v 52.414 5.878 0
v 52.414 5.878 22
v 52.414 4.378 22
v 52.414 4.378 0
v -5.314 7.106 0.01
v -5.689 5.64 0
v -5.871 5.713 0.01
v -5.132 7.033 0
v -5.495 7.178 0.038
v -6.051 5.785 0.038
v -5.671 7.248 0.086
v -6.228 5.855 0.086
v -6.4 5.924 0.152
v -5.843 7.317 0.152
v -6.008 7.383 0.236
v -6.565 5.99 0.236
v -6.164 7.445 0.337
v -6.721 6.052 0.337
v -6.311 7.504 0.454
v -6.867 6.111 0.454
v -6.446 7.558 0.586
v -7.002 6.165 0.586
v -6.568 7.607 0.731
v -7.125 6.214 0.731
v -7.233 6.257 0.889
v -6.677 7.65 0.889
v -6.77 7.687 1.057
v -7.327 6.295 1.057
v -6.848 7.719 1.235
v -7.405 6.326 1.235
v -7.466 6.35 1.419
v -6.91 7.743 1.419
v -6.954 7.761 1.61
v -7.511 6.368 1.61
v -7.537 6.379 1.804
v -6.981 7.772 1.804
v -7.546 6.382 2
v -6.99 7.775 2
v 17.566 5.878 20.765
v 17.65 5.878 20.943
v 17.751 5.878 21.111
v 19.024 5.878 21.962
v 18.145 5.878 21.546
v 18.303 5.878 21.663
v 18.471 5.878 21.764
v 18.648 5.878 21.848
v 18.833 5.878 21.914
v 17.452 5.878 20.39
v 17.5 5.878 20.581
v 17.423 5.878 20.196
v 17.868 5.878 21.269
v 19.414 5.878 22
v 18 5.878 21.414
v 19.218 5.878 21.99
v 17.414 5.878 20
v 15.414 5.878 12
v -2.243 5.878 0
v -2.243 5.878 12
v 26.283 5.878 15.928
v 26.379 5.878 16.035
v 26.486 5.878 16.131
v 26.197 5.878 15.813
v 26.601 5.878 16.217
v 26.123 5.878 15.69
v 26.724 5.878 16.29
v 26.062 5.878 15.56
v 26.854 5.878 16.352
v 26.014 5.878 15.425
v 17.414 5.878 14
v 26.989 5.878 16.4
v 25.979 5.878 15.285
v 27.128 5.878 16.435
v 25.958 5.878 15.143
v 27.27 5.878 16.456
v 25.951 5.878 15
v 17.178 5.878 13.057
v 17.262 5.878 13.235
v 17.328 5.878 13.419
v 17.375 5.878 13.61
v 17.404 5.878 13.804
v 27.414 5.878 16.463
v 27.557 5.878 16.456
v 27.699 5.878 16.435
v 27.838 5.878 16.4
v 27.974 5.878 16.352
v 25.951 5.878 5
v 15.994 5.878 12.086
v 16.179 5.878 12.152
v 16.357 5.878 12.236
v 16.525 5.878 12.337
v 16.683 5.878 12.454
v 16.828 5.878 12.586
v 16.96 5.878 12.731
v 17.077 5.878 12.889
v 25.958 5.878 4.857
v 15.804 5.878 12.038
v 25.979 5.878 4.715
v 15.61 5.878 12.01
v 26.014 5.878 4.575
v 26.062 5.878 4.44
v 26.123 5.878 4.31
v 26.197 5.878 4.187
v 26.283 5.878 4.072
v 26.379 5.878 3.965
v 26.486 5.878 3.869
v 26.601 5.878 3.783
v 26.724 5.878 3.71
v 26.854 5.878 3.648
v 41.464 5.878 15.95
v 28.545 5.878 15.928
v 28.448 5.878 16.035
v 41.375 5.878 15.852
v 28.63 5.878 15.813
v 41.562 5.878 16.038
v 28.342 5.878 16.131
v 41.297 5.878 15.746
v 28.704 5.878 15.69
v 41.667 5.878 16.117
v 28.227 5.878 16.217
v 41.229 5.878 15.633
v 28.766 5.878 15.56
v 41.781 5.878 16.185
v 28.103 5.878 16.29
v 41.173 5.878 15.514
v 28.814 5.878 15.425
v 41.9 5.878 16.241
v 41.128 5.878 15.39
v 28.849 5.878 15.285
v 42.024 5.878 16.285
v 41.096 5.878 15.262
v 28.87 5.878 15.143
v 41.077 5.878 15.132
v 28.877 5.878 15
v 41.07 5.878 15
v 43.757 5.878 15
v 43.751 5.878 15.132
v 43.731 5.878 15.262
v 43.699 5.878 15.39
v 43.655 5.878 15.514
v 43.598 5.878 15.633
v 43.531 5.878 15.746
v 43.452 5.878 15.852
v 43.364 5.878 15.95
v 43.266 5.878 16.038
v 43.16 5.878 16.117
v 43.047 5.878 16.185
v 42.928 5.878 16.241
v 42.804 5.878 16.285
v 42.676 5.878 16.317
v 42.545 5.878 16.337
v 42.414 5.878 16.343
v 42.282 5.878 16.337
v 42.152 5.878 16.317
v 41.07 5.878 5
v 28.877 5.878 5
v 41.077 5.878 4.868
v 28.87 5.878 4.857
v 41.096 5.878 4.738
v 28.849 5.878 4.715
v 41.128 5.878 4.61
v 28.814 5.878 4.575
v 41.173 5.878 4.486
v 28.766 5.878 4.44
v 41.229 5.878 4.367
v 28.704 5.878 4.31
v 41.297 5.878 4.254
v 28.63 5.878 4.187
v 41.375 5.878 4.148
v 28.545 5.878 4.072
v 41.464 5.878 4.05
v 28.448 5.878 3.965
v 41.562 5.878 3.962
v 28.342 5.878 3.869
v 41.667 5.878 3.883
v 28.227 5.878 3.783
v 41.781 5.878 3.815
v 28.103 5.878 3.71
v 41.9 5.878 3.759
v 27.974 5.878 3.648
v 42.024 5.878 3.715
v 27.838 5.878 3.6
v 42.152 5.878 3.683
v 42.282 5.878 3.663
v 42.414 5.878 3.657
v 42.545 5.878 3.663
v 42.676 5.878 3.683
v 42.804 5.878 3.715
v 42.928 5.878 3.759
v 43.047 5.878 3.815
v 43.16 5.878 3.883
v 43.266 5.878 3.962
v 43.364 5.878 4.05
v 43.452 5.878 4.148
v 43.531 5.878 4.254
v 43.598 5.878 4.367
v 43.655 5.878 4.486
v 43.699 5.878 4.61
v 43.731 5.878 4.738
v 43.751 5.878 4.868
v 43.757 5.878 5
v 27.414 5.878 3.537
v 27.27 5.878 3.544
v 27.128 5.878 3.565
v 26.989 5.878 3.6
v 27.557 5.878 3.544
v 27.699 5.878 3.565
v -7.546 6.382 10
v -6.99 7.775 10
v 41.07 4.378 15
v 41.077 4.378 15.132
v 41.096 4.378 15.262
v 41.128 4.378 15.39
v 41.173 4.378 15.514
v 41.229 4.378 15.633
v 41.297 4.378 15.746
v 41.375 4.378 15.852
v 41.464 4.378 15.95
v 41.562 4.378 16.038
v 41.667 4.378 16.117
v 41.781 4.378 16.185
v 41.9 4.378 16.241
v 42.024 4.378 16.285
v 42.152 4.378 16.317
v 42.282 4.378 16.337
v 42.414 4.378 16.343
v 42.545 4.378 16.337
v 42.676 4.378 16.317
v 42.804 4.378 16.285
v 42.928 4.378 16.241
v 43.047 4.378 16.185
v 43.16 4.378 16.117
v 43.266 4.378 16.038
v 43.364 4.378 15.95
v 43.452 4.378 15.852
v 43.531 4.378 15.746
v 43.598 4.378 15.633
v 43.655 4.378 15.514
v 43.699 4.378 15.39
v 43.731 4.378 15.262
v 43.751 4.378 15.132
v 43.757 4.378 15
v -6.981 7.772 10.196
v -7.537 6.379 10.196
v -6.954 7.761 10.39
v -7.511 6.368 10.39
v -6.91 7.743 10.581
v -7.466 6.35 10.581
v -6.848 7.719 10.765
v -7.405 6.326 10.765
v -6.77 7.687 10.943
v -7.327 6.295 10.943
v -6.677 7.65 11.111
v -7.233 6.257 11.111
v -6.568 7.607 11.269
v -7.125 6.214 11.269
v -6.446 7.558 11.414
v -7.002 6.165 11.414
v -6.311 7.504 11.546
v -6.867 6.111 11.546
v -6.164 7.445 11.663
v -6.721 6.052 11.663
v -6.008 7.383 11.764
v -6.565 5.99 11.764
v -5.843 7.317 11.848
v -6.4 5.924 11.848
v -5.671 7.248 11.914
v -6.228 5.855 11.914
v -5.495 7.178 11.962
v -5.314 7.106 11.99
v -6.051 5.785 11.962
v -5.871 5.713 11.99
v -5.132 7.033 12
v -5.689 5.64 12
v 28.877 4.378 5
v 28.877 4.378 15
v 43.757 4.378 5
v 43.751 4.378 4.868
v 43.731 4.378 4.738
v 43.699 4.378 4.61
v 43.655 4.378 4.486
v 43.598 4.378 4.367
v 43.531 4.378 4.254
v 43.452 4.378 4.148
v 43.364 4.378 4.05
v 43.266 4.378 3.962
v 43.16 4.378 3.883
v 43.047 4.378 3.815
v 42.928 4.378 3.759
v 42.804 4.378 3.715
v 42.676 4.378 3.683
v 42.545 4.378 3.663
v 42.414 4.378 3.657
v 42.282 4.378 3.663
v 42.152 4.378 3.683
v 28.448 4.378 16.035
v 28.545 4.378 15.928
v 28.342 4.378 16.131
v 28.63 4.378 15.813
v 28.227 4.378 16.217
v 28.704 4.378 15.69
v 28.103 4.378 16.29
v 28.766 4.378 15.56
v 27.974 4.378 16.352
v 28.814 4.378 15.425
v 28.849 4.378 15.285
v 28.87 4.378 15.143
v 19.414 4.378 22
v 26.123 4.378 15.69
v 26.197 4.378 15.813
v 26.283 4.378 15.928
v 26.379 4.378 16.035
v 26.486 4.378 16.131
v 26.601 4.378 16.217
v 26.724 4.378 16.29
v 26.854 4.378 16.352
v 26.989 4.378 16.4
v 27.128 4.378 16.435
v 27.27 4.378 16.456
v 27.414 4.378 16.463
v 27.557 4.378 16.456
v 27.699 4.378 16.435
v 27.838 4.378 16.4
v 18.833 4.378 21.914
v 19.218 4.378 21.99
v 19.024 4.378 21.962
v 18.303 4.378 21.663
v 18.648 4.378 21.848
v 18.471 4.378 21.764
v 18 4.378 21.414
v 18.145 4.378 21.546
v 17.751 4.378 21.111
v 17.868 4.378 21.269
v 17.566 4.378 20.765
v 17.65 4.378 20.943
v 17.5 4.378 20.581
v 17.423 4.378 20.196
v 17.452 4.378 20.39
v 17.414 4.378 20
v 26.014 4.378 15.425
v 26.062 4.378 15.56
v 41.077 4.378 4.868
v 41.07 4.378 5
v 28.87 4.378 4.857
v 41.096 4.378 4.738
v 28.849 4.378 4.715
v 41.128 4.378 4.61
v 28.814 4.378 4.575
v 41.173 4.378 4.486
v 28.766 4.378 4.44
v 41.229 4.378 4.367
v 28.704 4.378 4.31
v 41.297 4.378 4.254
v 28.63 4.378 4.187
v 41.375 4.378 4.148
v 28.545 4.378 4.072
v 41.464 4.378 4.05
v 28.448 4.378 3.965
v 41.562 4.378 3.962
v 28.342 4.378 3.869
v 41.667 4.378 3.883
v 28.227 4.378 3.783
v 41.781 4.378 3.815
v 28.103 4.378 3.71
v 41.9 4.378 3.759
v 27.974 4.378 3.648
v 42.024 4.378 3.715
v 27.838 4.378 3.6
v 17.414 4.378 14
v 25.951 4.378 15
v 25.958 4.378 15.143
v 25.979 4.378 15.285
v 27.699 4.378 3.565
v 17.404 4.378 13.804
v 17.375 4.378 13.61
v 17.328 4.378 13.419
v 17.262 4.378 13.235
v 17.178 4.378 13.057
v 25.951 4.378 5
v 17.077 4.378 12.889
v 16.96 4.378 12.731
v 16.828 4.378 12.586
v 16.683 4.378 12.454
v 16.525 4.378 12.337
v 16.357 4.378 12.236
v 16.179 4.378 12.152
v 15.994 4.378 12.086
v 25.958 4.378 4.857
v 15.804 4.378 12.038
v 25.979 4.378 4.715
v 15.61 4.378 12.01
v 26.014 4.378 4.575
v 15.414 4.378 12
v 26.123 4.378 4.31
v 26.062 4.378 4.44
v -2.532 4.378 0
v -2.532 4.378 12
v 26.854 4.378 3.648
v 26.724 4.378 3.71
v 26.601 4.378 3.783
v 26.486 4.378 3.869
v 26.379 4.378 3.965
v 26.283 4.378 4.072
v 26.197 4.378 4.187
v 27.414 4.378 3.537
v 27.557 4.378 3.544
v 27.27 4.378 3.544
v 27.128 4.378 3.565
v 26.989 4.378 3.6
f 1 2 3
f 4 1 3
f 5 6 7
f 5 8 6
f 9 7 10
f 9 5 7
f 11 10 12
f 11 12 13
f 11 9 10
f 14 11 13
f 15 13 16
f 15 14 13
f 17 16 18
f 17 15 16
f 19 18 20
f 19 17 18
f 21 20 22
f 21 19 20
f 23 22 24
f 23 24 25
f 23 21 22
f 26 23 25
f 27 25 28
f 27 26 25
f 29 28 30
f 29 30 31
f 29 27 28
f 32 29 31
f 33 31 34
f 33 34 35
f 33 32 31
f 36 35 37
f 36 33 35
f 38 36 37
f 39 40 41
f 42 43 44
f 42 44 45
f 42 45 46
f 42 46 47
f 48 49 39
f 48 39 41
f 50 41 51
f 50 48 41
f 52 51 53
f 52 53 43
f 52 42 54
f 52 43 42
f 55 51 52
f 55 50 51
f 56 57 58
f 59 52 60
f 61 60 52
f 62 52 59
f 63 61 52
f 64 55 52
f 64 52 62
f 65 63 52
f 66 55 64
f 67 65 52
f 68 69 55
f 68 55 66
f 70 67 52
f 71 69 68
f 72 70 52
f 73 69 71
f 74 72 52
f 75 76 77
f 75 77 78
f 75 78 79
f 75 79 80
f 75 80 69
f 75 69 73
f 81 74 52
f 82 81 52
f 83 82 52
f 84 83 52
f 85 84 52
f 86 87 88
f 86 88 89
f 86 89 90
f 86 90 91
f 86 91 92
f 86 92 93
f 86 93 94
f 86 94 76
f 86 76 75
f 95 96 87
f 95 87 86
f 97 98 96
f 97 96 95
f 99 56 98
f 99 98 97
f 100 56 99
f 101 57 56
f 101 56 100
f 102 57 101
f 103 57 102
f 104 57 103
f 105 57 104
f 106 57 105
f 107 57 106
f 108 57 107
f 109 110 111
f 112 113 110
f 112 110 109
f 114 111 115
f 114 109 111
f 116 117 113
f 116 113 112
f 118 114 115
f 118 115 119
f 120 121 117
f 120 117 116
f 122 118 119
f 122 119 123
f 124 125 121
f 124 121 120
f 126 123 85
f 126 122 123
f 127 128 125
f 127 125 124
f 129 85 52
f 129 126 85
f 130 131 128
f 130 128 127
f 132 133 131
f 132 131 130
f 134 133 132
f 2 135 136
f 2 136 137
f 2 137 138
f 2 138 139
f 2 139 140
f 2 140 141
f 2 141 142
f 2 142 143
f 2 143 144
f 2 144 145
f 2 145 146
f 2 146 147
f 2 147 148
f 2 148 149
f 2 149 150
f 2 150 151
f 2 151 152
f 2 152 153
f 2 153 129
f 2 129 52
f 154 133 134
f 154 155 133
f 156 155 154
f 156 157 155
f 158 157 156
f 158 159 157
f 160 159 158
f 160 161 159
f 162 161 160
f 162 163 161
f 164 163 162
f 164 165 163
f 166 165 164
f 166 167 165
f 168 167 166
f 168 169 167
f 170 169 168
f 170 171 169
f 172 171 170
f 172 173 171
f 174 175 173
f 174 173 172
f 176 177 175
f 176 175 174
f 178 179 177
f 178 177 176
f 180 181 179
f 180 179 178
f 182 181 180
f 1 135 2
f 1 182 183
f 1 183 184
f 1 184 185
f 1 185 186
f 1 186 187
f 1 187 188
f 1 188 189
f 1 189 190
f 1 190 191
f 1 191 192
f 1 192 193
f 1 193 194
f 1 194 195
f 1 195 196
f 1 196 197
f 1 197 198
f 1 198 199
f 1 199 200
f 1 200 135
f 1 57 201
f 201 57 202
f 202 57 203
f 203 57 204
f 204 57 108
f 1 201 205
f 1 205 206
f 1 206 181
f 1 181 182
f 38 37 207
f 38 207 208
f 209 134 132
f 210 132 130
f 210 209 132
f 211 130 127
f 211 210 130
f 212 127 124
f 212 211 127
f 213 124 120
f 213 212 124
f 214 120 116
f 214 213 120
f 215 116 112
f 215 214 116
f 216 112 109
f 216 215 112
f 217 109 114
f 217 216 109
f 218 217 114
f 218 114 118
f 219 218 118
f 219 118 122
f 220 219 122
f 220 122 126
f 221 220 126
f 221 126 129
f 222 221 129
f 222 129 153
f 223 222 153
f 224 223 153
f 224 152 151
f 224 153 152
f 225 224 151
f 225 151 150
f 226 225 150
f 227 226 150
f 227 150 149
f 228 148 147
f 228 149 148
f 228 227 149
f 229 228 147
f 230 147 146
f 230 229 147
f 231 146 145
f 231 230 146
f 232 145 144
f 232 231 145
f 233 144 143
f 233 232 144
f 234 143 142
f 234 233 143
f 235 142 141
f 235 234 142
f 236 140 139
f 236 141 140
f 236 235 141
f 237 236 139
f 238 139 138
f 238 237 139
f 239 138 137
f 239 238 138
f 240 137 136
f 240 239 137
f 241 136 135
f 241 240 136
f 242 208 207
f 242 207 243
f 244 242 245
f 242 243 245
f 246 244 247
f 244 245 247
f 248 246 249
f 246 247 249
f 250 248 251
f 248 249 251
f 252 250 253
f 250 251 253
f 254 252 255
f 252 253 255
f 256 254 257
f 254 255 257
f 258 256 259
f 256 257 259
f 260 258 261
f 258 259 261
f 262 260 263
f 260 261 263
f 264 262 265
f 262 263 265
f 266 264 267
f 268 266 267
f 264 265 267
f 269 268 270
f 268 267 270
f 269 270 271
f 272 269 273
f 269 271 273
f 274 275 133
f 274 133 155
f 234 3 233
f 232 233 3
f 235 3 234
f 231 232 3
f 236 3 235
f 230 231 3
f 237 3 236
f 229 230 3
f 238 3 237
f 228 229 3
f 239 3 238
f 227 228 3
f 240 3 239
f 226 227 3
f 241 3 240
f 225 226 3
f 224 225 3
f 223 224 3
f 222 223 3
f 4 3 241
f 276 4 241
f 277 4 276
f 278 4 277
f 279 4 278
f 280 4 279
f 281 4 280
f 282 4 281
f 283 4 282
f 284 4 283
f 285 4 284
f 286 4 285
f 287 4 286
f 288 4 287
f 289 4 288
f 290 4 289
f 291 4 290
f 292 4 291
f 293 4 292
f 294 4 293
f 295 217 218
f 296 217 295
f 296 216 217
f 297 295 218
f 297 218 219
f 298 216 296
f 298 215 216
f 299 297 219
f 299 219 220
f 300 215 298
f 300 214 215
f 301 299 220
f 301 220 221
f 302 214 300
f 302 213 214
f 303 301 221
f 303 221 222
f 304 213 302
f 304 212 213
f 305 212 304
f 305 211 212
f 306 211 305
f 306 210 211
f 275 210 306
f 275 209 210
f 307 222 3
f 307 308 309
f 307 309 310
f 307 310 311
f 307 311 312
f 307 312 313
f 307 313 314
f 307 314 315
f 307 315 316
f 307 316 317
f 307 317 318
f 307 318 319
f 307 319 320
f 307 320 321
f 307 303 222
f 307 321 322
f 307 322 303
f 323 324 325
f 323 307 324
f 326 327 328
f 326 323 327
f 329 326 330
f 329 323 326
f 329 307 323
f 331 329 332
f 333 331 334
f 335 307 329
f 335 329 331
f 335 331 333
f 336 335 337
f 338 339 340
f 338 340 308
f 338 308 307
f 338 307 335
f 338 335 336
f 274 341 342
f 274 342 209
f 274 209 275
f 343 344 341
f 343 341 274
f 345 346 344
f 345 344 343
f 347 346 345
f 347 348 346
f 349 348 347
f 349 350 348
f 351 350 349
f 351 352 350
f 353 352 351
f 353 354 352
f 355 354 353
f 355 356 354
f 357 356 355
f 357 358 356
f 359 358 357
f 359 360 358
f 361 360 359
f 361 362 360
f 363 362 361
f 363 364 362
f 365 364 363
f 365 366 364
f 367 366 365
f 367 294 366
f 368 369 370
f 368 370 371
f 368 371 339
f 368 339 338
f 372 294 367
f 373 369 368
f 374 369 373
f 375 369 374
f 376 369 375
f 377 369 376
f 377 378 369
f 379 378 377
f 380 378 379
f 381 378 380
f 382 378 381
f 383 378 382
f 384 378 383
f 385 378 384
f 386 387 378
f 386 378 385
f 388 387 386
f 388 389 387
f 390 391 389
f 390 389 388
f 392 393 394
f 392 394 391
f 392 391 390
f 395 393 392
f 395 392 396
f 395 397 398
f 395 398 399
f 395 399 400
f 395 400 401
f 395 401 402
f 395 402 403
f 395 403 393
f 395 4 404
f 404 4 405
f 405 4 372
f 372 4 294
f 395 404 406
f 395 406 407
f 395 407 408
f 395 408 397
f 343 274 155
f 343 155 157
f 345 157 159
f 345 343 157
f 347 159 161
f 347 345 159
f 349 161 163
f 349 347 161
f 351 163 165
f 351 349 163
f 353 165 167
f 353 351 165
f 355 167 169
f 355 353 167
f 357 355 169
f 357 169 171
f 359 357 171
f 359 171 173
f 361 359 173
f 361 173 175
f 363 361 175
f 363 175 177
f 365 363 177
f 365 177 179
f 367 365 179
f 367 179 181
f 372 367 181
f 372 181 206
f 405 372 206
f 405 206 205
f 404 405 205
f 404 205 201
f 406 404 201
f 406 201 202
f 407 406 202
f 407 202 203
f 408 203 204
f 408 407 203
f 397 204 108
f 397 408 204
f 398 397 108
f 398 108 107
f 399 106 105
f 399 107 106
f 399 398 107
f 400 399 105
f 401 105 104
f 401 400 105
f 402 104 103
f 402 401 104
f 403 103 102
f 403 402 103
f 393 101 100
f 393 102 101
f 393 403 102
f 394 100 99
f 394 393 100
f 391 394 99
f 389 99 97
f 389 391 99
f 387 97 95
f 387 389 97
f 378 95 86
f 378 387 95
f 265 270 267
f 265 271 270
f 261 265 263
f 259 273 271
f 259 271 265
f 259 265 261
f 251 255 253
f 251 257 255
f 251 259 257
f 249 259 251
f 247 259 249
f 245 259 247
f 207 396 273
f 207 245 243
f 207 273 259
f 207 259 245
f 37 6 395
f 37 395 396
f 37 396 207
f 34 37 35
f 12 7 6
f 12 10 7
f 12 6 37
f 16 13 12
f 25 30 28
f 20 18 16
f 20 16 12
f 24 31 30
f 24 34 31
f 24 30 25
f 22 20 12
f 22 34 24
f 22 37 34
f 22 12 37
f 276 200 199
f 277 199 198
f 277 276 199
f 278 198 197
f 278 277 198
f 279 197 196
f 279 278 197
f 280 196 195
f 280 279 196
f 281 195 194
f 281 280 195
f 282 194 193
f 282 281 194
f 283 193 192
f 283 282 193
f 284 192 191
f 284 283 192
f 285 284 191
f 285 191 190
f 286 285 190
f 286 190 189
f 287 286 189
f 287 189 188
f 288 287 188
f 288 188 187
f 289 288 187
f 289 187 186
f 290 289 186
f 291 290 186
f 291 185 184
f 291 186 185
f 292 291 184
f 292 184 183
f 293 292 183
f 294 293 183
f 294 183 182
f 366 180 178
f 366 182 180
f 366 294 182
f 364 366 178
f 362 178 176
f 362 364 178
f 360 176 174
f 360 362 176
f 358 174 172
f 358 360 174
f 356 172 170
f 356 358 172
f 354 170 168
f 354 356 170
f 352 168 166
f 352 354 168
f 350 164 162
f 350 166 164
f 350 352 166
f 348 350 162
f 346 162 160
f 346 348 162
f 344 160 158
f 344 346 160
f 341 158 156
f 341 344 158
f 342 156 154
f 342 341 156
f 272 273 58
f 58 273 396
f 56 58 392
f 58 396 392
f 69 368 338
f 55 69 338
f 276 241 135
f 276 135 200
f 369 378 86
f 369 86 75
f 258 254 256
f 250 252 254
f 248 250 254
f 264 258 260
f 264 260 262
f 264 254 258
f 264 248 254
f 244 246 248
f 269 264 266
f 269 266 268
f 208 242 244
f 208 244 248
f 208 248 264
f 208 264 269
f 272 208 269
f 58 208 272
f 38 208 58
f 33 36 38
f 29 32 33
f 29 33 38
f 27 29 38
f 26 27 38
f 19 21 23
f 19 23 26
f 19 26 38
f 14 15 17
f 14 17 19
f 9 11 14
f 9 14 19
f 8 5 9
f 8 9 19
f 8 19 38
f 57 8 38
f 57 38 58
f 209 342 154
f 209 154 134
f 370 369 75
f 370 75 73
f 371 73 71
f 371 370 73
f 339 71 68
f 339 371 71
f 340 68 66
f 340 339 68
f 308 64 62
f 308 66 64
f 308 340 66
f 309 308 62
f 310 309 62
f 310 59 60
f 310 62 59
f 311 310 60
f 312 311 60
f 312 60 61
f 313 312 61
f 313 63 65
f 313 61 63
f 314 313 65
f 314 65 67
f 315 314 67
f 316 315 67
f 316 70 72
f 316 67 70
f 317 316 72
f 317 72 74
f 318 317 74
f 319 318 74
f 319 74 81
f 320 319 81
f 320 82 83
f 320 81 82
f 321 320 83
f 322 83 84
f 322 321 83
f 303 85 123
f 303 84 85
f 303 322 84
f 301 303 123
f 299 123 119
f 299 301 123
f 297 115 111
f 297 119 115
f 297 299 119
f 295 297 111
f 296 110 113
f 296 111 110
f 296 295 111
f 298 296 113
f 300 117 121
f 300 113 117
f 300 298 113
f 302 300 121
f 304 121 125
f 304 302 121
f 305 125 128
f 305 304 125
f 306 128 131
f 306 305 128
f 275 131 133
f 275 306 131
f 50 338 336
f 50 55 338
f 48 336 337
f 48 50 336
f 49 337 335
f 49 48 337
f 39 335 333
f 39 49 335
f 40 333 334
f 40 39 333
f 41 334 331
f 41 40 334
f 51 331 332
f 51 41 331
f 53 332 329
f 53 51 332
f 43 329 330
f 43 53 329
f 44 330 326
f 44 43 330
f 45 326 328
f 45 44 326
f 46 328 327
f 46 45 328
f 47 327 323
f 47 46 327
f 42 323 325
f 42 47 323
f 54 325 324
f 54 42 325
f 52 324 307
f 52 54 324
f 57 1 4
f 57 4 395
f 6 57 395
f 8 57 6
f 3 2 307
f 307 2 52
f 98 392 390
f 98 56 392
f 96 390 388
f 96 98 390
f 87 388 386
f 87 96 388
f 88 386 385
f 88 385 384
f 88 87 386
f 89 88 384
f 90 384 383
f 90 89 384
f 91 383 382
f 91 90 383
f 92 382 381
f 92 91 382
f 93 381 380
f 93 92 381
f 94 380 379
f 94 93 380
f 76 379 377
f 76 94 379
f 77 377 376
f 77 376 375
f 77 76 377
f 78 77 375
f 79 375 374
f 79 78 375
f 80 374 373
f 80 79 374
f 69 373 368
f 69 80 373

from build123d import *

# Parameters (mm, degrees)
BOSS_EXTRUDE1_DEPTH = 22
SKETCH2_W           = 32.324702558
SKETCH2_H           = 10
CUT_EXTRUDE1_DEPTH  = 22
FILLET2_R           = 2


with BuildPart() as part:
    # Sketch1 → Boss-Extrude1 (new body)
    with BuildSketch(Plane.XY):
        Polygon((-2.531920895, 4.378113215), (-7.546246883, 6.382242673), (-6.989544256, 7.775111003), (-2.24326139, 5.878113215), (52.413753117, 5.878113215), (52.413753117, 4.378113215), align=None)
    extrude(amount=BOSS_EXTRUDE1_DEPTH)

    # Sketch2 → Cut-Extrude1 (cut)
    with BuildSketch(Plane.XZ.offset(-4.378113215)):
        with Locations((1.251401838, 17)):
            Rectangle(SKETCH2_W, SKETCH2_H)
        with BuildLine():
            Line((28.876886466, 15), (28.876886466, 5))
            ThreePointArc((28.876886466, 5), (27.413753117, 3.536866651), (25.950619767, 5))
            Line((25.950619767, 5), (25.950619767, 15))
            ThreePointArc((25.950619767, 15), (27.413753117, 16.463133349), (28.876886466, 15))
        make_face()
        with BuildLine():
            Line((43.757050896, 15), (43.757050896, 5))
            ThreePointArc((43.757050896, 5), (42.413753117, 3.656702221), (41.070455337, 5))
            Line((41.070455337, 5), (41.070455337, 15))
            ThreePointArc((41.070455337, 15), (42.413753117, 16.343297779), (43.757050896, 15))
        make_face()
    extrude(amount=-CUT_EXTRUDE1_DEPTH, mode=Mode.SUBTRACT)

    # Fillet2
    fillet2_edges = [part.edges().sort_by_distance(p)[0] for p in [
        (17.413753117, 5.128113215, 22),
        (-7.26789557, 7.078676838, 12),
        (17.413753117, 5.128113215, 12),
        (-7.26789557, 7.078676838, 0),
    ]]
    fillet(fillet2_edges, radius=FILLET2_R)


solid = part.part
